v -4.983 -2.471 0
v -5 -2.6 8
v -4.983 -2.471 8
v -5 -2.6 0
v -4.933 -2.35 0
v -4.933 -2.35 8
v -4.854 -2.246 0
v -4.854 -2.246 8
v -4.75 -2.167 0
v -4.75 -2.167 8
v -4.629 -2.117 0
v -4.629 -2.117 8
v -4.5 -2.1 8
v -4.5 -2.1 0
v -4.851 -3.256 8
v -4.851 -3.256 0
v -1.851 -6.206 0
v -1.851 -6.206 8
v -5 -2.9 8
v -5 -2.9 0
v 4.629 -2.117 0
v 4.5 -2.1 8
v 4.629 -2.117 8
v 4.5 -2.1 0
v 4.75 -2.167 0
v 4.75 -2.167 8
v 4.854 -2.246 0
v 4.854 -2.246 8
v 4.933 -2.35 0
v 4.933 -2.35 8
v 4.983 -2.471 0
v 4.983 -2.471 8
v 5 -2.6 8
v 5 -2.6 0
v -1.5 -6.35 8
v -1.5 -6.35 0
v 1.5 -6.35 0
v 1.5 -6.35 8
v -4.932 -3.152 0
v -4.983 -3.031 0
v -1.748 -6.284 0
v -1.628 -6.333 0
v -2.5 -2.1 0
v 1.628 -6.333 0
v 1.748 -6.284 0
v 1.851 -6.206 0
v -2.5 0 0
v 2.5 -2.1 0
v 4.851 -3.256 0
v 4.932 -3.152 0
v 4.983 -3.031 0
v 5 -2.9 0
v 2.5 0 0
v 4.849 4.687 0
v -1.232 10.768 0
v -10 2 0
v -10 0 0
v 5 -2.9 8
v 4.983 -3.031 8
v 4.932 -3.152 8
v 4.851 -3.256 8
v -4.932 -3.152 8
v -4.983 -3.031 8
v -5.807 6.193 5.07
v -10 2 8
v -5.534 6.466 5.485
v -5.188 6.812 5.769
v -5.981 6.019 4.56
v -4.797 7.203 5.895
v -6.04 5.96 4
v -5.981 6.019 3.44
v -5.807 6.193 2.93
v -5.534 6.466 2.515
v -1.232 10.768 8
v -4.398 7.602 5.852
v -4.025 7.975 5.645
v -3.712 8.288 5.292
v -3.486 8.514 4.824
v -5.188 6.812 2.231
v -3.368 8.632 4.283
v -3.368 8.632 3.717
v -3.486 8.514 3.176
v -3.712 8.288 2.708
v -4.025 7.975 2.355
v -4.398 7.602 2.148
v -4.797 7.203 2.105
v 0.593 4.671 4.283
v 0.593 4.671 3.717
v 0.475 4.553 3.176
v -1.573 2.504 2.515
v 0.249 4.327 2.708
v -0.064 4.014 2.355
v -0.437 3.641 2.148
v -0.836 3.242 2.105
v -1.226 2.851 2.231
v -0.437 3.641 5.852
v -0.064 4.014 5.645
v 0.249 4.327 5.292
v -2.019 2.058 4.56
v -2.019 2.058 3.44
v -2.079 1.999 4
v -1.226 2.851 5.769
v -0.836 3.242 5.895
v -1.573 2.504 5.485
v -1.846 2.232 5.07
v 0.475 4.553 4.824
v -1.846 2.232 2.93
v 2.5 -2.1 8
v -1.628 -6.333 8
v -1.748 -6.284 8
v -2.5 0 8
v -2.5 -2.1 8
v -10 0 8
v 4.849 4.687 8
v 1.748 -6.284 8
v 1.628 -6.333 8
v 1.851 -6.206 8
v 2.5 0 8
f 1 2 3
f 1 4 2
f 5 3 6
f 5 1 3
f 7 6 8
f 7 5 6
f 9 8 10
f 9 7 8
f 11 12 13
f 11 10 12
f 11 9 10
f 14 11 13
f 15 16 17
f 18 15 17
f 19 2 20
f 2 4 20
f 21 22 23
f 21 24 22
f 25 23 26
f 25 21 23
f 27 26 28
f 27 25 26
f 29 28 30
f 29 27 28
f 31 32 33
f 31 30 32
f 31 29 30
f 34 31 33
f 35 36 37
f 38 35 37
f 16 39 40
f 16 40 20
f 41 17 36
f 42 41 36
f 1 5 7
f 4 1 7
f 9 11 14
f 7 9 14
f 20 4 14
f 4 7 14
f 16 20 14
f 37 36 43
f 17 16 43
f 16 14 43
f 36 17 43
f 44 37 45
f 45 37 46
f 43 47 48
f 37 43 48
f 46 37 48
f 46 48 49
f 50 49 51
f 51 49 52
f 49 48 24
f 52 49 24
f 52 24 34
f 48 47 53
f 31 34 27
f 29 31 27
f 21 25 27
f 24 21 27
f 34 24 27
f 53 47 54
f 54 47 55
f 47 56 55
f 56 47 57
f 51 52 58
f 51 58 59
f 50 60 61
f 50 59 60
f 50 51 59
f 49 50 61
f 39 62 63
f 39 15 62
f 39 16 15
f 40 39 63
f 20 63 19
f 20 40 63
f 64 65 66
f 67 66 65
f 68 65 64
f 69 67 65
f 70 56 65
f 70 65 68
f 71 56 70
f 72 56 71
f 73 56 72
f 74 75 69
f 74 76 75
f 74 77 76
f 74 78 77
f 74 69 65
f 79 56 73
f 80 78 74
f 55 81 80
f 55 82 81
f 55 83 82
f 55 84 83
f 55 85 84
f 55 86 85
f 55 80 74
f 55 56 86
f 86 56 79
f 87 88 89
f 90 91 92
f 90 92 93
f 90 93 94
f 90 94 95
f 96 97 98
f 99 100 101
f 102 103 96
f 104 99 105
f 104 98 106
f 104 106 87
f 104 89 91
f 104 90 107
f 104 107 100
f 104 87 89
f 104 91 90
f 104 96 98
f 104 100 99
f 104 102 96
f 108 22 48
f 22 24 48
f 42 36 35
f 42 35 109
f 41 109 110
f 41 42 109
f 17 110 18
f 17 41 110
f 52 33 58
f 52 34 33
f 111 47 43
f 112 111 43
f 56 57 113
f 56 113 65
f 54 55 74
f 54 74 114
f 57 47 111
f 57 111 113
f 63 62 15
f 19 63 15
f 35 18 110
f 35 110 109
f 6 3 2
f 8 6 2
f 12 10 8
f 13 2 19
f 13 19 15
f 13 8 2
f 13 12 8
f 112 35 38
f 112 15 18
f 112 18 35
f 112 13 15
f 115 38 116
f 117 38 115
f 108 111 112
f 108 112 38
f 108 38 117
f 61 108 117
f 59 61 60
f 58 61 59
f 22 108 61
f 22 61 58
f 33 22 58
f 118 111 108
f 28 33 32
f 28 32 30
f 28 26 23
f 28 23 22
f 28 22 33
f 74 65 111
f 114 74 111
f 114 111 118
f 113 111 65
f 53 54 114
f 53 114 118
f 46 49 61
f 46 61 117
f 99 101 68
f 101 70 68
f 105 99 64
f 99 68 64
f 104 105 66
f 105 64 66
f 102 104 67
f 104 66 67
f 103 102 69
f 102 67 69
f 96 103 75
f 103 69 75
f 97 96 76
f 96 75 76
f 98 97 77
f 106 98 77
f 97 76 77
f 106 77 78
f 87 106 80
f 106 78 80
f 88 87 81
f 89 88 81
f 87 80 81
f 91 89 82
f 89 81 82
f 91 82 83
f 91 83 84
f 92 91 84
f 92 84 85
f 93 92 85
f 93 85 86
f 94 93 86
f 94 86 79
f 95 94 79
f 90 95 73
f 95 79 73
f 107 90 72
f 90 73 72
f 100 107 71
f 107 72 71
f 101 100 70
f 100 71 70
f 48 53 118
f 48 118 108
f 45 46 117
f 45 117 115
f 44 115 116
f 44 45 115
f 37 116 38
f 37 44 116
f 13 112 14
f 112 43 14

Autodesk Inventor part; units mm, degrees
ref_plane "YZ Plane" through (0, 0, 0) normal (1, 0, 0) x (0, 1, 0)
ref_plane "XZ Plane" through (0, 0, 0) normal (0, 1, 0) x (-1, 0, 0)
ref_plane "XY Plane" through (0, 0, 0) normal (0, 0, 1) x (1, 0, 0)
sketch "Sketch1" plane through (0, 0, 0) normal (0, 0, 1) x (1, 0, 0)
  arc A0 (-5, -2.9) -> (-4.8506, -3.2565) centre (-4.5, -2.9) ccw
  line L0 (-5, -2.6) -> (-5, -2.9)
  arc A1 (-4.5, -2.1) -> (-5, -2.6) centre (-4.5, -2.6) ccw
  line L1 (-4.8506, -3.2565) -> (-1.8506, -6.2065)
  arc A2 (-1.8506, -6.2065) -> (-1.5, -6.35) centre (-1.5, -5.85) ccw
  line L2 (-1.5, -6.35) -> (1.5, -6.35)
  line L3 (4.5, -2.1) -> (-4.5, -2.1)
  arc A3 (1.5, -6.35) -> (1.8506, -6.2065) centre (1.5, -5.85) ccw
  line L4 (4.8506, -3.2565) -> (1.8506, -6.2065)
  arc A4 (5, -2.6) -> (4.5, -2.1) centre (4.5, -2.6) ccw
  arc A5 (4.8506, -3.2565) -> (5, -2.9) centre (4.5, -2.9) ccw
  line L5 (5, -2.6) -> (5, -2.9)
  line L6 (-2.5, 0) -> (2.5, 0)
  line L7 (-2.5, 0) -> (-2.5, -2.1)
  line L8 (2.5, 0) -> (2.5, -2.1)
  point P0 (0, -6.35)
  point P1 (0, 0)
  point P2 (0, -2.1)
  point P3 (0, 0)
  dimension "d9" = 4.25
  dimension "d10" = 10
  dimension "d12" = 0.3
  dimension "d13" = 9
  dimension "d14" = 3
  dimension "d17" = 2.1
  dimension "d18" = 5
extrude "Extrusion1" add sketch "Sketch1" along normal blind 8
sketch "Sketch2" plane through (0, 0, 0) normal (0, 0, -1) x (-1, 0, 0)
  line L0 (-2.5, 0) -> (2.5, 0) projected
  line L1 (2.5, 0) -> (12, 0)
  line L2 (-2.5, -2.1) -> (-2.5, 0) projected
  line L3 (12, 0) -> (3.3532, 8.6468)
  line L4 (-0.6066, 4.687) -> (2.0804, 2)
  line L5 (3.3532, 8.6468) -> (-0.6066, 4.687)
  line L6 (2.0804, 2) -> (6.0402, 5.9598)
  line L7 (10, 0) -> (10, 2)
  line L8 (3.3532, 8.6468) -> (1.2319, 10.7681)
  line L9 (1.2319, 10.7681) -> (-4.8492, 4.687)
  line L10 (-4.8492, 4.687) -> (-2.5, 0)
  point P0 (0, 0)
  dimension "d21" = 12
  dimension "d23" = 45
  dimension "d24" = 3.8
  dimension "d25" = 5.6
  dimension "d26" = 2
  dimension "d28" = 3
  dimension "d34" = 10
extrude "Extrusion2" add sketch "Sketch2" against normal up to surface (8 mm away) contours L10 L9 L8 L5 L4 L6 L3 L7 L1 L0 | L3 L6 L4 L5
sketch "Sketch3" plane through (-1.2319, 10.7681, 0) normal (-0.7071, 0.7071, 0) x (-0.7071, -0.7071, 0)
  line L0 (12.4, 0) -> (12.4, 8) projected
  line L1 (6.8, 0) -> (3, 0)
  line L2 (12.4, 0) -> (0, 0) projected
  circle A0 centre (4.9, 4) radius 1.9
  point P0 (6.7431, 0)
  point P1 (12.4, 4)
  point P2 (4.9, 0)
  dimension "d31" = 3.8
extrude "Extrusion3" cut sketch "Sketch3" against normal blind 5.6
properties part number "Profil-ElBoardHold"
